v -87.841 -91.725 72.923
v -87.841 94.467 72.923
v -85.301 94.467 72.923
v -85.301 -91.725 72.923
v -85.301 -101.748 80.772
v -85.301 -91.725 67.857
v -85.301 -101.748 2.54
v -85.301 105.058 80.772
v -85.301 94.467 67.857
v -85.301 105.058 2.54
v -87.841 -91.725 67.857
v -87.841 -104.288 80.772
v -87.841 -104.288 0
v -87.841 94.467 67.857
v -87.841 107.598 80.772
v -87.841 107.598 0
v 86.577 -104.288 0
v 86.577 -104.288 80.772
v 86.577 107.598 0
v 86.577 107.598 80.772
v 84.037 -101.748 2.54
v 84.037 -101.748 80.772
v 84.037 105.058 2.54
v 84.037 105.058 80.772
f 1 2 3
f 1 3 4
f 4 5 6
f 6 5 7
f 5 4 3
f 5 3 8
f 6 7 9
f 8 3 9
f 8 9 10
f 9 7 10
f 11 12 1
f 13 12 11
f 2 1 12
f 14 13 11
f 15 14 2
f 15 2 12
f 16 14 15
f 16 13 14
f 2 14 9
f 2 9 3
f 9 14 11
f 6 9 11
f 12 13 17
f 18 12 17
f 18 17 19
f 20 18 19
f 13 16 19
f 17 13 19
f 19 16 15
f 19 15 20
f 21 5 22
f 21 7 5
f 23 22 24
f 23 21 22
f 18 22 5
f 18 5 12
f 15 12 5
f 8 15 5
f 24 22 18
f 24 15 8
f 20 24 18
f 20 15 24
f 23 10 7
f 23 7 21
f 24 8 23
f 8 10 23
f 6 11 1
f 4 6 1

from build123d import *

# Parameters (mm, degrees)
F0_W     = 174.4176968932
F0_H     = 211.885496974
F1_DEPTH = 80.772
F2_T     = -2.54
F3_W     = 186.191752553
F3_H     = 5.066819489
F4_DEPTH = 11.938


with BuildPart() as f1:
    # F0 (on Top) → F1 (new body)
    with BuildSketch(Plane.XY):
        with Locations((-0.6318576634, 1.6548894346)):
            Rectangle(F0_W, F0_H)
    extrude(amount=F1_DEPTH)

    # F2
    f2_openings = [f1.faces().sort_by_distance(p)[0] for p in [
        (-0.631858, 1.654889, 80.772),
    ]]
    offset(amount=F2_T, openings=f2_openings)

    # F3 (on face) → F4 (cut)
    with BuildSketch(Plane(origin=(-87.84070611, 0, 0), x_dir=(0, -1, 0), z_dir=(-1, 0, 0))):
        with Locations((-1.3709291816, 70.3899897635)):
            Rectangle(F3_W, F3_H)
    extrude(amount=-F4_DEPTH, mode=Mode.SUBTRACT)


solid = f1.part
